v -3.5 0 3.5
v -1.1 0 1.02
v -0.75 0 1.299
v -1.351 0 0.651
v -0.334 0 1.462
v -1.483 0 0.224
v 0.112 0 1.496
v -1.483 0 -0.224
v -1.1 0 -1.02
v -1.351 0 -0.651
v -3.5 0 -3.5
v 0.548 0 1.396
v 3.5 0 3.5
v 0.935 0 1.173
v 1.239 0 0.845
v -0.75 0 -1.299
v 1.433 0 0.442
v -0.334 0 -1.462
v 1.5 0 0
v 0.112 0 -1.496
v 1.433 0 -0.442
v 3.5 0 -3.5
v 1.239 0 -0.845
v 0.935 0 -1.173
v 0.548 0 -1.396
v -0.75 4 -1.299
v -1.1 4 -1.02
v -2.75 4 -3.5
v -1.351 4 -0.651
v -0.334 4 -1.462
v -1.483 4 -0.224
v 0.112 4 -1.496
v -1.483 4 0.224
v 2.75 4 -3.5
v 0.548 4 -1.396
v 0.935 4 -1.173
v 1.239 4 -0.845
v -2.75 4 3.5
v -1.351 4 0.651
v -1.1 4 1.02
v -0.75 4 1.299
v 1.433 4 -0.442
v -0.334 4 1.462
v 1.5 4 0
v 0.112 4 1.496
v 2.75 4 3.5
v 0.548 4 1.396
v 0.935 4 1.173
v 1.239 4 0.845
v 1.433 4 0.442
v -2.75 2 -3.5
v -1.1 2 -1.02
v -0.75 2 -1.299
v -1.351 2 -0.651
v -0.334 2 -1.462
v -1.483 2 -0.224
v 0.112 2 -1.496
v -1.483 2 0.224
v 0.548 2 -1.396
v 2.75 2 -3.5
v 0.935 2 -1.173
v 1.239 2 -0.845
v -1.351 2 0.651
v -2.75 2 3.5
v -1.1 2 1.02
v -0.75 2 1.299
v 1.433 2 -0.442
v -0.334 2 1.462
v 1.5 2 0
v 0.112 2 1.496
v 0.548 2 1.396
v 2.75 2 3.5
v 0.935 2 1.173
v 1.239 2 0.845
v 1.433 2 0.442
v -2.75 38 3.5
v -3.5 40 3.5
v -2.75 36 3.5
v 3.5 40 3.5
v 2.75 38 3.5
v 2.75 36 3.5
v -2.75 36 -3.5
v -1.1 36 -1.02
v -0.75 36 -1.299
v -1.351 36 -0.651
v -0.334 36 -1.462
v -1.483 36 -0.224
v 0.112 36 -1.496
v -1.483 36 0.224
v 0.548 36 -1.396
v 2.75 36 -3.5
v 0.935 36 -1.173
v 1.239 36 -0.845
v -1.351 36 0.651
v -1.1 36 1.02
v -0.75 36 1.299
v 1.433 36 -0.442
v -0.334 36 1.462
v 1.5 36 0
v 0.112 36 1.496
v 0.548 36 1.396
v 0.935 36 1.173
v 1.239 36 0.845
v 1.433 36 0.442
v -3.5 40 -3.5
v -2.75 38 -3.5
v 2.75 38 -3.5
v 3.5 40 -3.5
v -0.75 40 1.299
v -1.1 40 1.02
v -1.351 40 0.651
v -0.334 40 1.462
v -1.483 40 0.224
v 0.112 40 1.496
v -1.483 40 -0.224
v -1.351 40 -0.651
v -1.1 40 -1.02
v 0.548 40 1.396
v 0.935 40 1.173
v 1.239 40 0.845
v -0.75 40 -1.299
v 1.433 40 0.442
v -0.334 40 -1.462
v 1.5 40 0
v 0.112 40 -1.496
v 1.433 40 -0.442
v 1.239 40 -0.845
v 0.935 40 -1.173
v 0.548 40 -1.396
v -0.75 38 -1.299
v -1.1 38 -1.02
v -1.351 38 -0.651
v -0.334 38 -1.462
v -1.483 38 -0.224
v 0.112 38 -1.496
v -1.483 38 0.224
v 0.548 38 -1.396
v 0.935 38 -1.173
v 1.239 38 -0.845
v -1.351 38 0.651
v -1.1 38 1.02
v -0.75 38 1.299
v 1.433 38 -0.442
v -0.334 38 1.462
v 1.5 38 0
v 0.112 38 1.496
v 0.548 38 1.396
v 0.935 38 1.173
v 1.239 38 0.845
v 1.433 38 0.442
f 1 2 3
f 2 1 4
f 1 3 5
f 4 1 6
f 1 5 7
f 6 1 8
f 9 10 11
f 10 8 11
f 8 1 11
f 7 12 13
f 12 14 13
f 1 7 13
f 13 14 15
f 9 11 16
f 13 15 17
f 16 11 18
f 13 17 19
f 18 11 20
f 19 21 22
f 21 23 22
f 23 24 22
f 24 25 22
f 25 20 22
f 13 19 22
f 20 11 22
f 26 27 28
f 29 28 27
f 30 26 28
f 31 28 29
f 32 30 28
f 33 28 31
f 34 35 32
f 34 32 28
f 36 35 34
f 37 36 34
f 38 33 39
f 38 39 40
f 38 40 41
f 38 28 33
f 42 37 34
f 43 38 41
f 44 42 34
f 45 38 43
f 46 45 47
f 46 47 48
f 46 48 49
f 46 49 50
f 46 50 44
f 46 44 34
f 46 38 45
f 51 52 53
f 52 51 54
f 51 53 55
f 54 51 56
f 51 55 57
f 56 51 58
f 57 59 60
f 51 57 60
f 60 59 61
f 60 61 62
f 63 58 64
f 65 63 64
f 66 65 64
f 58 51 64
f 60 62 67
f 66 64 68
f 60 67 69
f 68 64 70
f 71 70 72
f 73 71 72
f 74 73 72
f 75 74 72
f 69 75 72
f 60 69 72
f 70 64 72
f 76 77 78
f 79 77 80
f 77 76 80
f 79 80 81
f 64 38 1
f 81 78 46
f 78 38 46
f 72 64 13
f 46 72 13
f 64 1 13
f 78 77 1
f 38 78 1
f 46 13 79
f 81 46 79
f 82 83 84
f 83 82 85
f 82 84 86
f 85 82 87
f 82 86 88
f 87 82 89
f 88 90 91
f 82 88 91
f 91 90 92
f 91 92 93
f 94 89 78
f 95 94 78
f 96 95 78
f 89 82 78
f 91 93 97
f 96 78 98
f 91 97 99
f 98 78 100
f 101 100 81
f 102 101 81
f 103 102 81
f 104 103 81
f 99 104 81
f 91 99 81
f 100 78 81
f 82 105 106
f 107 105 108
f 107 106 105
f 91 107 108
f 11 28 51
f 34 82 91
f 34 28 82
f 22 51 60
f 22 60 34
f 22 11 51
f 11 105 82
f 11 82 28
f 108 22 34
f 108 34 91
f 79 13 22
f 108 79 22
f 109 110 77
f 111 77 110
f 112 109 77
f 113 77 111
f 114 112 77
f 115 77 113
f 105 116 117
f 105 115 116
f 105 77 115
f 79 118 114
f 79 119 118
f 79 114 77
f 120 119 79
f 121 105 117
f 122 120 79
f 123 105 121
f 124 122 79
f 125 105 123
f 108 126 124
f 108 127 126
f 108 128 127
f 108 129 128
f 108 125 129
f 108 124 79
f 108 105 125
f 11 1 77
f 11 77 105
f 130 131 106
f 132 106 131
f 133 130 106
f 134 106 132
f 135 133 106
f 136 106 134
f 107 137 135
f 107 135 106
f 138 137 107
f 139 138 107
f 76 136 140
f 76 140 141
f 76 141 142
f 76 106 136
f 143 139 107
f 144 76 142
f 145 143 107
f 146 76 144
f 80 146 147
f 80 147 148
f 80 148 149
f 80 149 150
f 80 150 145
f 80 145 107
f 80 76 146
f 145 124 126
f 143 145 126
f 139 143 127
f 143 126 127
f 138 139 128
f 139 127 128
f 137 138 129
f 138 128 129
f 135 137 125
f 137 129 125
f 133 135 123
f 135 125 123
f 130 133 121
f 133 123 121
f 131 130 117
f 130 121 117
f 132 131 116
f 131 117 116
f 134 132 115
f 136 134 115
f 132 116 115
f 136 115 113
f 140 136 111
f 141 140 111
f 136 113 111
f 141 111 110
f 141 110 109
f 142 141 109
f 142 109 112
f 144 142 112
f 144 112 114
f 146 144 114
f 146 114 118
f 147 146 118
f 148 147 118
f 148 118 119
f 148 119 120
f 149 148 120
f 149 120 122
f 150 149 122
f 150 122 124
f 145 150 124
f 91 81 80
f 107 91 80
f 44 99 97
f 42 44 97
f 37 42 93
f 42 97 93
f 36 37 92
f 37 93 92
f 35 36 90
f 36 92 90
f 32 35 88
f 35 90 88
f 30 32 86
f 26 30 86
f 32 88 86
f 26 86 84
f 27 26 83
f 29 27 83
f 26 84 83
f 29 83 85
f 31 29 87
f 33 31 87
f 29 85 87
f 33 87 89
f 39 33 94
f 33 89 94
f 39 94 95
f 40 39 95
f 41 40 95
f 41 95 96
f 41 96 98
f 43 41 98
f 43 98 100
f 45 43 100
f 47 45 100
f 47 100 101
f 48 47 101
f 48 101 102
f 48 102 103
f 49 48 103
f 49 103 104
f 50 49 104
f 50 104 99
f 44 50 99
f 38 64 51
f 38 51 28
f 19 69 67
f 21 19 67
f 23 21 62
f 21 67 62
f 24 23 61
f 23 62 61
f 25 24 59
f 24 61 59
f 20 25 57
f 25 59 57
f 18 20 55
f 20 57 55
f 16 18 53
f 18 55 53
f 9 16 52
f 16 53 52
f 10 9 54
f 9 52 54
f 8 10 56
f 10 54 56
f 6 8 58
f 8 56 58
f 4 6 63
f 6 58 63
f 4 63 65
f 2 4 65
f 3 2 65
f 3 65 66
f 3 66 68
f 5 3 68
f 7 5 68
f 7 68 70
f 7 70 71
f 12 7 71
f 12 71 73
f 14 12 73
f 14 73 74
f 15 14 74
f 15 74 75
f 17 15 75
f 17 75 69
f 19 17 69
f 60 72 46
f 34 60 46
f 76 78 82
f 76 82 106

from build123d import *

# Parameters (mm, degrees)
SKETCH1_W           = 7
SKETCH1_H           = 7
BOSS_EXTRUDE1_DEPTH = 40
SKETCH2_R           = 1.5
CUT_EXTRUDE1_DEPTH  = 41
SKETCH3_W           = 5.5
SKETCH3_H           = 2
CUT_EXTRUDE2_DEPTH  = 41


with BuildPart() as part:
    # Sketch1 → Boss-Extrude1 (new body)
    with BuildSketch(Plane(origin=(0, 0, 0), x_dir=(1, 0, 0), z_dir=(0, 1, 0))):
        Rectangle(SKETCH1_W, SKETCH1_H)
    extrude(amount=BOSS_EXTRUDE1_DEPTH)

    # Sketch2 → Cut-Extrude1 (cut)
    with BuildSketch(Plane(origin=(0, 40, 0), x_dir=(1, 0, 0), z_dir=(0, 1, 0))):
        Circle(SKETCH2_R)
    extrude(amount=-CUT_EXTRUDE1_DEPTH, mode=Mode.SUBTRACT)

    # Sketch3 → Cut-Extrude2 (cut)
    with BuildSketch(Plane.XY.offset(3.5)):
        with Locations((0, 3)):
            Rectangle(SKETCH3_W, SKETCH3_H)
        with Locations((0, 37)):
            Rectangle(SKETCH3_W, SKETCH3_H)
    extrude(amount=-CUT_EXTRUDE2_DEPTH, mode=Mode.SUBTRACT)


solid = part.part
